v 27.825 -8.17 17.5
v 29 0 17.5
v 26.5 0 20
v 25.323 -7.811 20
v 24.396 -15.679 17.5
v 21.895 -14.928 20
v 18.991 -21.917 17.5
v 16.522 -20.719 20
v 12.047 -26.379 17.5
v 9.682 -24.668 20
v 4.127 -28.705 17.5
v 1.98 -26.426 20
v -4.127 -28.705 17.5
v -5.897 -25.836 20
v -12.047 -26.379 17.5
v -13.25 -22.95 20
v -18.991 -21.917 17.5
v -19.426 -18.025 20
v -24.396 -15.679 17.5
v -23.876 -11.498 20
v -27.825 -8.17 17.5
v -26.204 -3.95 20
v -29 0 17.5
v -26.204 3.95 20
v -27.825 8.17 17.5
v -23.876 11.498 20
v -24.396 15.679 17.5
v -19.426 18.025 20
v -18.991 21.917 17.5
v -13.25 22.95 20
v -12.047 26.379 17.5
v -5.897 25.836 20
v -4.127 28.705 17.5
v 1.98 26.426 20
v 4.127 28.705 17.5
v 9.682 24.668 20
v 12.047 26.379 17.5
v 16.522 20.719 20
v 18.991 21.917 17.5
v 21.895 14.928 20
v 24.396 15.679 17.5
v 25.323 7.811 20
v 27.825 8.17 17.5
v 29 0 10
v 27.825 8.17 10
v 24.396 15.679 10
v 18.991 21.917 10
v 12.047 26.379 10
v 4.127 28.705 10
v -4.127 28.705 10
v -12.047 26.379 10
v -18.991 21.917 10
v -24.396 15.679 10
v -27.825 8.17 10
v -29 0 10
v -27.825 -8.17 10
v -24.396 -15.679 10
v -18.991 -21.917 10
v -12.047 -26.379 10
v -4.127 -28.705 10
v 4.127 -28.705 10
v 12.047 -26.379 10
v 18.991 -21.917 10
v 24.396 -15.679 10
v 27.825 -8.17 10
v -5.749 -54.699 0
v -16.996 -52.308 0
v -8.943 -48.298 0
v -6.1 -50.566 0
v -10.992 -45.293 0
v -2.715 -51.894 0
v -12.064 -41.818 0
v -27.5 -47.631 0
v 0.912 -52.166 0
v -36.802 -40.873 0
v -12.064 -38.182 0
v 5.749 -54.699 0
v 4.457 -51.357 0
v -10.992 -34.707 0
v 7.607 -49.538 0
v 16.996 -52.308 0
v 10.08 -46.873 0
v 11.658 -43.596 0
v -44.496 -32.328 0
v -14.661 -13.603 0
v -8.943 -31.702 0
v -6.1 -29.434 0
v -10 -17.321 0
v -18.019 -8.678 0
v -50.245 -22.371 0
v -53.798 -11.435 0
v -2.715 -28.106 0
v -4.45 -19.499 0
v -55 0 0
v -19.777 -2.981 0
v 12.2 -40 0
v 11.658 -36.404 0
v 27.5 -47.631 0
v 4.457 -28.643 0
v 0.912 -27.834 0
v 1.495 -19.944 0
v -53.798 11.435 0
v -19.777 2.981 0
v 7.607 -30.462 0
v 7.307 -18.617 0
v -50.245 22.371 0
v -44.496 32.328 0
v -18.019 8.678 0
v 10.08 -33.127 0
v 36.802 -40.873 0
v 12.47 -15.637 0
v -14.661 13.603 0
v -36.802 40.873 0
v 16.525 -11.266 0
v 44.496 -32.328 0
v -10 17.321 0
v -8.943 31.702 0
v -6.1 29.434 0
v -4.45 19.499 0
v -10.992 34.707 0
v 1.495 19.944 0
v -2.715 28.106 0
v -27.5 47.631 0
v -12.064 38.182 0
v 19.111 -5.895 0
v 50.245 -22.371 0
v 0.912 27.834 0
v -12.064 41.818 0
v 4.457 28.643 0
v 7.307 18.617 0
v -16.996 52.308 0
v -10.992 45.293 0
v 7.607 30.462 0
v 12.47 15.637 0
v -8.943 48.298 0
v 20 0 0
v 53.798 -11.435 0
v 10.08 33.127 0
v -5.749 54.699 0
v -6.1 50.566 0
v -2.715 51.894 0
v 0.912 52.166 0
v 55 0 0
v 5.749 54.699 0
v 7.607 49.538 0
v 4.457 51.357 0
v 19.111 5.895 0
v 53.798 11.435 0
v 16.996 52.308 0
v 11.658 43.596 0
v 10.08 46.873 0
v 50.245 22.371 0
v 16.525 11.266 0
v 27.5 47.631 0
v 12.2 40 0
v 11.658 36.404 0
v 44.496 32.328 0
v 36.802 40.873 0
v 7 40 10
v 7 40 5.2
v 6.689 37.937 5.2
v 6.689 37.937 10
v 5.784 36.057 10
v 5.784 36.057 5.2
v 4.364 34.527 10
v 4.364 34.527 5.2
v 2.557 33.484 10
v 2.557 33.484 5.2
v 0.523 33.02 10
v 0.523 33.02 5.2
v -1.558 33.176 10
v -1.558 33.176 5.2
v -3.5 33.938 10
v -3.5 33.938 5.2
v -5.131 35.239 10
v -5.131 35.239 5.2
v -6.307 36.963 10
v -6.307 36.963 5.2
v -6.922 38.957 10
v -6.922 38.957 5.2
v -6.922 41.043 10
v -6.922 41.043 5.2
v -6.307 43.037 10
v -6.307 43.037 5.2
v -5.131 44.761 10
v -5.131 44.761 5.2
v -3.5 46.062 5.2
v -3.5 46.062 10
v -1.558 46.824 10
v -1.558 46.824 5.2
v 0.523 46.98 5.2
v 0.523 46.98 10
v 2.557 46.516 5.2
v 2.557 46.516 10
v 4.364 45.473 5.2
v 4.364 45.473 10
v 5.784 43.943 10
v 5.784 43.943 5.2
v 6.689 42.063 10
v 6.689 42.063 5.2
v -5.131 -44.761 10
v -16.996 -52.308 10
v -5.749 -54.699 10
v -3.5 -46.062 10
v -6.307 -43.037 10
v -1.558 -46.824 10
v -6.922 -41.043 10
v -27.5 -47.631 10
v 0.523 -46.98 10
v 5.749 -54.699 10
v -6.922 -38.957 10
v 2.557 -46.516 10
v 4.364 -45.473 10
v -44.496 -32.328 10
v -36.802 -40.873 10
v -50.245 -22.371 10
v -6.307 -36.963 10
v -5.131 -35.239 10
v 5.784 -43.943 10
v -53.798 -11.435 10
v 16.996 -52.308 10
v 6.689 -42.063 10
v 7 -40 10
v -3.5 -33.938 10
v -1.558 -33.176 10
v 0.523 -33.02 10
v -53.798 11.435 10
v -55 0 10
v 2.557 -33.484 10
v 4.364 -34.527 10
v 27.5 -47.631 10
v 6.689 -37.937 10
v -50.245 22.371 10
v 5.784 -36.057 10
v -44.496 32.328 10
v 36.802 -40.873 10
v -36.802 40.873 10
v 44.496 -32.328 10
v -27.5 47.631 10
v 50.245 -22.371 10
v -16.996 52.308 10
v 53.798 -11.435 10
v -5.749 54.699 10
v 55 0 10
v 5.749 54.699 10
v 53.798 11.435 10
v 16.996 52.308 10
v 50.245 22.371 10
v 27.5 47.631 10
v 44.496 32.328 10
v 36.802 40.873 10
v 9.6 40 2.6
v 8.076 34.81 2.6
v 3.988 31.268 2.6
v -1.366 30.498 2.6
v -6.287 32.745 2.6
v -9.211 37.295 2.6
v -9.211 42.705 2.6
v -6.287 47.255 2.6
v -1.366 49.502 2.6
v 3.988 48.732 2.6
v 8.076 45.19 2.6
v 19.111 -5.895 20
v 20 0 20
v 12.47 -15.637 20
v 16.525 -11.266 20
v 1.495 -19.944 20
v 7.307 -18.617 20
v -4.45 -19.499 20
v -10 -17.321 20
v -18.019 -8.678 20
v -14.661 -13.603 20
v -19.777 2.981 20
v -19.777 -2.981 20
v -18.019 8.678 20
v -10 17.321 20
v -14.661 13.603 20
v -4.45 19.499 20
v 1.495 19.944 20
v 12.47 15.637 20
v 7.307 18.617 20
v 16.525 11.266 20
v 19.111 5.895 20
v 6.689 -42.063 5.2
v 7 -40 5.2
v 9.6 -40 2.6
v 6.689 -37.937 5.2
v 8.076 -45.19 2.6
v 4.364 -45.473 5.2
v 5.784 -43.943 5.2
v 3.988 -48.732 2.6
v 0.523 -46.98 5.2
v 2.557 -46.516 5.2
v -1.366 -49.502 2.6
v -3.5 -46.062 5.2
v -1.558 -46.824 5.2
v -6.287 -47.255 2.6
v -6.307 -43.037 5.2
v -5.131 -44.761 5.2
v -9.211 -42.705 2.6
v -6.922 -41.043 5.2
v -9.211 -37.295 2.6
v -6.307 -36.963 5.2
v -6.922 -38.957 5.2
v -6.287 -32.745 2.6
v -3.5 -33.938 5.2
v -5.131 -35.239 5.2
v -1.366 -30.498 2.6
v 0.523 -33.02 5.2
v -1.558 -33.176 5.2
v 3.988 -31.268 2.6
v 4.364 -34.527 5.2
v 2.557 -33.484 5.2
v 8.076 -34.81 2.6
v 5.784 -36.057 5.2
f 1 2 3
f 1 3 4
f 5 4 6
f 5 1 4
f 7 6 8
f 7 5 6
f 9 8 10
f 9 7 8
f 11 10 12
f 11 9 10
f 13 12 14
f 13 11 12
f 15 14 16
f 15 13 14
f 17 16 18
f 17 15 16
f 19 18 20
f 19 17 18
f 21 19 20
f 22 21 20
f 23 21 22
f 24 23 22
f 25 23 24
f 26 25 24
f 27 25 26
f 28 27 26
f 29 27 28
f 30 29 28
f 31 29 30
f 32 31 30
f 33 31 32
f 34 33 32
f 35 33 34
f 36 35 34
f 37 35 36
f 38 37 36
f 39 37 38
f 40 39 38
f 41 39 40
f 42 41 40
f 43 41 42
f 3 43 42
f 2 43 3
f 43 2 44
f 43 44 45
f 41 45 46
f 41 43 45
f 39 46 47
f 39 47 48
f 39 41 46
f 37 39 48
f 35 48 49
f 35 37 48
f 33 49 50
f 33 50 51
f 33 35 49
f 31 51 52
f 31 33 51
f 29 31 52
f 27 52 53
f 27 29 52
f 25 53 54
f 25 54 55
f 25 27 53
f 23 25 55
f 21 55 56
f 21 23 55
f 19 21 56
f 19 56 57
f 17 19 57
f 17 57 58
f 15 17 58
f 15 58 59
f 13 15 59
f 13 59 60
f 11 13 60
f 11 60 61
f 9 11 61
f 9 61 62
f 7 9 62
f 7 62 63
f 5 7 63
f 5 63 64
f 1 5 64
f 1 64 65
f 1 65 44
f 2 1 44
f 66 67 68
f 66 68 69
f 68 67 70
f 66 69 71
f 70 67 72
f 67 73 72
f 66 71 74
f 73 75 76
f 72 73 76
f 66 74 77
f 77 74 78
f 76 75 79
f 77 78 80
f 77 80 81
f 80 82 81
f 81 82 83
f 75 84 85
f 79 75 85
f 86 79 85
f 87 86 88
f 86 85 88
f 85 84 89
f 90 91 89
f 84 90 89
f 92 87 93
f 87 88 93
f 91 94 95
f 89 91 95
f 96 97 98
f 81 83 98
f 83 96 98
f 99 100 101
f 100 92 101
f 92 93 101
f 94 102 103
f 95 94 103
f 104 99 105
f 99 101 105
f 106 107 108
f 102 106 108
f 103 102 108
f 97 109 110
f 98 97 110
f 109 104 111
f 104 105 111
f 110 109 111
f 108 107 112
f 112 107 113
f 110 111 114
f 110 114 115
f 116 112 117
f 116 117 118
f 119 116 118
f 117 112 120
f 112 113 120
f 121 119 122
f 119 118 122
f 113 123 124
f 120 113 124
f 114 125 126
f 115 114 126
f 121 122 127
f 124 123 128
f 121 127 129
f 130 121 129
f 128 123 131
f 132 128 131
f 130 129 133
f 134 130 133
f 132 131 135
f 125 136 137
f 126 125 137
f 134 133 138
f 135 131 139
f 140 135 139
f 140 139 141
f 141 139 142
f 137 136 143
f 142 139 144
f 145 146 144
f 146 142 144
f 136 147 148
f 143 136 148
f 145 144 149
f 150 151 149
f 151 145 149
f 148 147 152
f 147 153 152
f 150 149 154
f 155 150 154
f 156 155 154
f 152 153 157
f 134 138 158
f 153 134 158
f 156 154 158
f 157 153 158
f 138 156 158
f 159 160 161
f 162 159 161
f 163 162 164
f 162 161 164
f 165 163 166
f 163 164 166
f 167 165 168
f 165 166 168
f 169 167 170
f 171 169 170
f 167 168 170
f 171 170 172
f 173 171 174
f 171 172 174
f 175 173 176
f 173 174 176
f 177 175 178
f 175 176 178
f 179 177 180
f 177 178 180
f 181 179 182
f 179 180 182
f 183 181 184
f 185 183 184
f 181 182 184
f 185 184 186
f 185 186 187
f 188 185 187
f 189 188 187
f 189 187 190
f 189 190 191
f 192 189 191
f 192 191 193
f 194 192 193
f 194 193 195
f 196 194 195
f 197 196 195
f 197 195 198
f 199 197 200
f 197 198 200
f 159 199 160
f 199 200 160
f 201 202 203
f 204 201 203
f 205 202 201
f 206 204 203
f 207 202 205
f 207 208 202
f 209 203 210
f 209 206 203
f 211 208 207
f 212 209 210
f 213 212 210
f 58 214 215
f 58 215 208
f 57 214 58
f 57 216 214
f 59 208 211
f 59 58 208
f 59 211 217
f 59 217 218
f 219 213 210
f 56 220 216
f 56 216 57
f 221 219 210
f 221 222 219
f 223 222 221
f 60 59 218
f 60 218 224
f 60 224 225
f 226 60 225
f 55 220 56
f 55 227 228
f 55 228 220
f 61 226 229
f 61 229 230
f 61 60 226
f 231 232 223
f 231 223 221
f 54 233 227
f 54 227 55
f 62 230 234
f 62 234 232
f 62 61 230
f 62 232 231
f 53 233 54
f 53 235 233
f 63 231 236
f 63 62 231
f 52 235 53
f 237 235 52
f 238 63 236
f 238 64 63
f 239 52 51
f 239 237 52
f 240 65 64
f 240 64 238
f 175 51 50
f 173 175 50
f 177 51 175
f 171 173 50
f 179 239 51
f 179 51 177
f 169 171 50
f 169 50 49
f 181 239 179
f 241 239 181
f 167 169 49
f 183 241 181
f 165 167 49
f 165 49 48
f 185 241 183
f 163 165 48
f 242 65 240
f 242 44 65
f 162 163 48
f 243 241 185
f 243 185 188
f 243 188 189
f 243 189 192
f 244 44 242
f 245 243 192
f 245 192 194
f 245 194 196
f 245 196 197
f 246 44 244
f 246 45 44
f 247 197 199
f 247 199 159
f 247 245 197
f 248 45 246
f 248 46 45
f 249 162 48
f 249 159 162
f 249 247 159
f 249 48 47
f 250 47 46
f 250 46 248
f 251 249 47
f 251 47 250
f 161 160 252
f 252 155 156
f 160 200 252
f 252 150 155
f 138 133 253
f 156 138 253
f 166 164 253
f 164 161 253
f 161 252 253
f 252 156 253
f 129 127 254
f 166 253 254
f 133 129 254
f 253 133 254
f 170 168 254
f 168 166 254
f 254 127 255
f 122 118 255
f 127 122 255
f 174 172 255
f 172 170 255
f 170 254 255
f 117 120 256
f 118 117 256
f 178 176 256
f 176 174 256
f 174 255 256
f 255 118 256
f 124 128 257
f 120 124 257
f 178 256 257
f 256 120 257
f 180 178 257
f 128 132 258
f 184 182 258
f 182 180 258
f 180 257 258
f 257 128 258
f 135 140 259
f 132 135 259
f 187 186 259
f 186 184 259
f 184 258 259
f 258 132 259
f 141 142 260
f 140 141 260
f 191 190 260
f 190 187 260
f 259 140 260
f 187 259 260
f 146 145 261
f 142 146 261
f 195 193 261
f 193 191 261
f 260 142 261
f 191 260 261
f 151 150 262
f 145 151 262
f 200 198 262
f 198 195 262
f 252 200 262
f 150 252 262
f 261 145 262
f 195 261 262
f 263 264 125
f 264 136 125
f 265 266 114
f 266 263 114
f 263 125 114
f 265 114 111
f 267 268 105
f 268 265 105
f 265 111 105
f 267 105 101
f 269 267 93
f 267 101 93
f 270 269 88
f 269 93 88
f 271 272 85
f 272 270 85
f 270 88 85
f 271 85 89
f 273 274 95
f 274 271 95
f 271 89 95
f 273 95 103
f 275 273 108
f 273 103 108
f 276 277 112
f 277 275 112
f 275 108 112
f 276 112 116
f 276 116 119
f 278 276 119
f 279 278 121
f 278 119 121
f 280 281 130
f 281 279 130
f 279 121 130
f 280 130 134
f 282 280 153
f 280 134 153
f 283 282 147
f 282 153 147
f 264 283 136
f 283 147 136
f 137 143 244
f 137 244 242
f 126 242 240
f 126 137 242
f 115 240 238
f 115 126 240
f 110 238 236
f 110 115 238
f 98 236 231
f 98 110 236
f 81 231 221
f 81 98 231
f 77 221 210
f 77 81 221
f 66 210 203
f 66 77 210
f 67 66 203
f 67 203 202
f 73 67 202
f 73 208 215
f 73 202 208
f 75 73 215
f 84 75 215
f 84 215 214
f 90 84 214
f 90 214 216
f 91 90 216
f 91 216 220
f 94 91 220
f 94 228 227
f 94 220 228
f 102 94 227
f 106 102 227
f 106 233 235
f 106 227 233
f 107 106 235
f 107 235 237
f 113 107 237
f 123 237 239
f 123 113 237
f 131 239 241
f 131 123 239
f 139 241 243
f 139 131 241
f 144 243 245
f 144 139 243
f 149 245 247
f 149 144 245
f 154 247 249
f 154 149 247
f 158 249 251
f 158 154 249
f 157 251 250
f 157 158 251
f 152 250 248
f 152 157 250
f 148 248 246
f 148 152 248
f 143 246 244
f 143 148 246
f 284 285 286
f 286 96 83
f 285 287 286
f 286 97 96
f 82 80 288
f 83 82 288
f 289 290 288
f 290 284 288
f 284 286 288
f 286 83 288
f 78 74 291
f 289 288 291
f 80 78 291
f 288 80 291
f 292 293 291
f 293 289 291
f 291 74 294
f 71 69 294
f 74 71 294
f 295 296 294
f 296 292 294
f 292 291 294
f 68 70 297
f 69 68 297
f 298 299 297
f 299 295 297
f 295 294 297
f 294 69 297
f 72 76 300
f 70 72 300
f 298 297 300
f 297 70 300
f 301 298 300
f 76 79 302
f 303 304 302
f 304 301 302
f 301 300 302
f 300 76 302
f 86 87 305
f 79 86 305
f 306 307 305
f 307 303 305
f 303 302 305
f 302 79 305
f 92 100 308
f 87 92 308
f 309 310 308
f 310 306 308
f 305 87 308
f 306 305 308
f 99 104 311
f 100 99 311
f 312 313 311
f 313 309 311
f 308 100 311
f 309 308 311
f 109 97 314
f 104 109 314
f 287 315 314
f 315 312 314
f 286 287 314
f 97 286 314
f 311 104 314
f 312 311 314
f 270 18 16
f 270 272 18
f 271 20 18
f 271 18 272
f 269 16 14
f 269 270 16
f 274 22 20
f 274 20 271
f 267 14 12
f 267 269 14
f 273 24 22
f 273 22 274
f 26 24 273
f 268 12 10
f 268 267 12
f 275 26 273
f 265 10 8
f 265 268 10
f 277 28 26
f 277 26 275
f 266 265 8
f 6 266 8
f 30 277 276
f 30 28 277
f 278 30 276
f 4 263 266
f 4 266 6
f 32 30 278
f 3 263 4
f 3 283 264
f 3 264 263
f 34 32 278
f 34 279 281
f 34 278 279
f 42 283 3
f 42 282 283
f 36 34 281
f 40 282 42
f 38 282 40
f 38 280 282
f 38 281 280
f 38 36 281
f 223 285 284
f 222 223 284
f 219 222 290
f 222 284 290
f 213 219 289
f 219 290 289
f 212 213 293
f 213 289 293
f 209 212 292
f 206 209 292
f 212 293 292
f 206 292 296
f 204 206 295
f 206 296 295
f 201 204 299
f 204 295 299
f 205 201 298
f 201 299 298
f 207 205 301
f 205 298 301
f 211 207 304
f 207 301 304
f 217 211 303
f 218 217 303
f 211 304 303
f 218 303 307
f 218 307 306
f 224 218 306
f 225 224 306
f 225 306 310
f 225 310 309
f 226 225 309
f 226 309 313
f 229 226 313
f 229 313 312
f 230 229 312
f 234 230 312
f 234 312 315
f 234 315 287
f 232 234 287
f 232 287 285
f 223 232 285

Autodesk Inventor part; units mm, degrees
ref_plane "YZ Plane" through (0, 0, 0) normal (1, 0, 0) x (0, 1, 0)
ref_plane "XZ Plane" through (0, 0, 0) normal (0, 1, 0) x (-1, 0, 0)
ref_plane "XY Plane" through (0, 0, 0) normal (0, 0, 1) x (1, 0, 0)
sketch "Эскиз1" plane through (0, 0, 0) normal (0, 0, 1) x (1, 0, 0)
  circle A0 centre (0, 0) radius 55
  circle A1 centre (0, 0) radius 20
  circle A2 centre (0, 40) radius 7
  circle A3 centre (0, -40) radius 7
  dimension "d0" = 110
  dimension "d1" = 40
  dimension "d3" = 14
  dimension "d6" = 360
extrude "Выдавливание1" add sketch "Эскиз1" along normal blind 20
sketch "Эскиз2" plane through (0, 0, 20) normal (0, 0, 1) x (1, 0, 0)
  circle A0 centre (0, 0) radius 55 projected
  circle A1 centre (0, 0) radius 29
  dimension "d10" = 58
extrude "Выдавливание2" cut sketch "Эскиз2" against normal blind 10
chamfer "Фаска1" distance 2.5 angle 45 1 edges at (-29, 0, 20)
chamfer "Фаска2" distance 5.2 angle 45 1 edges at (-7, -40, 0)
chamfer "Фаска3" distance 5.2 angle 45 1 edges at (-7, 40, 0)
properties part number "Крышка"
